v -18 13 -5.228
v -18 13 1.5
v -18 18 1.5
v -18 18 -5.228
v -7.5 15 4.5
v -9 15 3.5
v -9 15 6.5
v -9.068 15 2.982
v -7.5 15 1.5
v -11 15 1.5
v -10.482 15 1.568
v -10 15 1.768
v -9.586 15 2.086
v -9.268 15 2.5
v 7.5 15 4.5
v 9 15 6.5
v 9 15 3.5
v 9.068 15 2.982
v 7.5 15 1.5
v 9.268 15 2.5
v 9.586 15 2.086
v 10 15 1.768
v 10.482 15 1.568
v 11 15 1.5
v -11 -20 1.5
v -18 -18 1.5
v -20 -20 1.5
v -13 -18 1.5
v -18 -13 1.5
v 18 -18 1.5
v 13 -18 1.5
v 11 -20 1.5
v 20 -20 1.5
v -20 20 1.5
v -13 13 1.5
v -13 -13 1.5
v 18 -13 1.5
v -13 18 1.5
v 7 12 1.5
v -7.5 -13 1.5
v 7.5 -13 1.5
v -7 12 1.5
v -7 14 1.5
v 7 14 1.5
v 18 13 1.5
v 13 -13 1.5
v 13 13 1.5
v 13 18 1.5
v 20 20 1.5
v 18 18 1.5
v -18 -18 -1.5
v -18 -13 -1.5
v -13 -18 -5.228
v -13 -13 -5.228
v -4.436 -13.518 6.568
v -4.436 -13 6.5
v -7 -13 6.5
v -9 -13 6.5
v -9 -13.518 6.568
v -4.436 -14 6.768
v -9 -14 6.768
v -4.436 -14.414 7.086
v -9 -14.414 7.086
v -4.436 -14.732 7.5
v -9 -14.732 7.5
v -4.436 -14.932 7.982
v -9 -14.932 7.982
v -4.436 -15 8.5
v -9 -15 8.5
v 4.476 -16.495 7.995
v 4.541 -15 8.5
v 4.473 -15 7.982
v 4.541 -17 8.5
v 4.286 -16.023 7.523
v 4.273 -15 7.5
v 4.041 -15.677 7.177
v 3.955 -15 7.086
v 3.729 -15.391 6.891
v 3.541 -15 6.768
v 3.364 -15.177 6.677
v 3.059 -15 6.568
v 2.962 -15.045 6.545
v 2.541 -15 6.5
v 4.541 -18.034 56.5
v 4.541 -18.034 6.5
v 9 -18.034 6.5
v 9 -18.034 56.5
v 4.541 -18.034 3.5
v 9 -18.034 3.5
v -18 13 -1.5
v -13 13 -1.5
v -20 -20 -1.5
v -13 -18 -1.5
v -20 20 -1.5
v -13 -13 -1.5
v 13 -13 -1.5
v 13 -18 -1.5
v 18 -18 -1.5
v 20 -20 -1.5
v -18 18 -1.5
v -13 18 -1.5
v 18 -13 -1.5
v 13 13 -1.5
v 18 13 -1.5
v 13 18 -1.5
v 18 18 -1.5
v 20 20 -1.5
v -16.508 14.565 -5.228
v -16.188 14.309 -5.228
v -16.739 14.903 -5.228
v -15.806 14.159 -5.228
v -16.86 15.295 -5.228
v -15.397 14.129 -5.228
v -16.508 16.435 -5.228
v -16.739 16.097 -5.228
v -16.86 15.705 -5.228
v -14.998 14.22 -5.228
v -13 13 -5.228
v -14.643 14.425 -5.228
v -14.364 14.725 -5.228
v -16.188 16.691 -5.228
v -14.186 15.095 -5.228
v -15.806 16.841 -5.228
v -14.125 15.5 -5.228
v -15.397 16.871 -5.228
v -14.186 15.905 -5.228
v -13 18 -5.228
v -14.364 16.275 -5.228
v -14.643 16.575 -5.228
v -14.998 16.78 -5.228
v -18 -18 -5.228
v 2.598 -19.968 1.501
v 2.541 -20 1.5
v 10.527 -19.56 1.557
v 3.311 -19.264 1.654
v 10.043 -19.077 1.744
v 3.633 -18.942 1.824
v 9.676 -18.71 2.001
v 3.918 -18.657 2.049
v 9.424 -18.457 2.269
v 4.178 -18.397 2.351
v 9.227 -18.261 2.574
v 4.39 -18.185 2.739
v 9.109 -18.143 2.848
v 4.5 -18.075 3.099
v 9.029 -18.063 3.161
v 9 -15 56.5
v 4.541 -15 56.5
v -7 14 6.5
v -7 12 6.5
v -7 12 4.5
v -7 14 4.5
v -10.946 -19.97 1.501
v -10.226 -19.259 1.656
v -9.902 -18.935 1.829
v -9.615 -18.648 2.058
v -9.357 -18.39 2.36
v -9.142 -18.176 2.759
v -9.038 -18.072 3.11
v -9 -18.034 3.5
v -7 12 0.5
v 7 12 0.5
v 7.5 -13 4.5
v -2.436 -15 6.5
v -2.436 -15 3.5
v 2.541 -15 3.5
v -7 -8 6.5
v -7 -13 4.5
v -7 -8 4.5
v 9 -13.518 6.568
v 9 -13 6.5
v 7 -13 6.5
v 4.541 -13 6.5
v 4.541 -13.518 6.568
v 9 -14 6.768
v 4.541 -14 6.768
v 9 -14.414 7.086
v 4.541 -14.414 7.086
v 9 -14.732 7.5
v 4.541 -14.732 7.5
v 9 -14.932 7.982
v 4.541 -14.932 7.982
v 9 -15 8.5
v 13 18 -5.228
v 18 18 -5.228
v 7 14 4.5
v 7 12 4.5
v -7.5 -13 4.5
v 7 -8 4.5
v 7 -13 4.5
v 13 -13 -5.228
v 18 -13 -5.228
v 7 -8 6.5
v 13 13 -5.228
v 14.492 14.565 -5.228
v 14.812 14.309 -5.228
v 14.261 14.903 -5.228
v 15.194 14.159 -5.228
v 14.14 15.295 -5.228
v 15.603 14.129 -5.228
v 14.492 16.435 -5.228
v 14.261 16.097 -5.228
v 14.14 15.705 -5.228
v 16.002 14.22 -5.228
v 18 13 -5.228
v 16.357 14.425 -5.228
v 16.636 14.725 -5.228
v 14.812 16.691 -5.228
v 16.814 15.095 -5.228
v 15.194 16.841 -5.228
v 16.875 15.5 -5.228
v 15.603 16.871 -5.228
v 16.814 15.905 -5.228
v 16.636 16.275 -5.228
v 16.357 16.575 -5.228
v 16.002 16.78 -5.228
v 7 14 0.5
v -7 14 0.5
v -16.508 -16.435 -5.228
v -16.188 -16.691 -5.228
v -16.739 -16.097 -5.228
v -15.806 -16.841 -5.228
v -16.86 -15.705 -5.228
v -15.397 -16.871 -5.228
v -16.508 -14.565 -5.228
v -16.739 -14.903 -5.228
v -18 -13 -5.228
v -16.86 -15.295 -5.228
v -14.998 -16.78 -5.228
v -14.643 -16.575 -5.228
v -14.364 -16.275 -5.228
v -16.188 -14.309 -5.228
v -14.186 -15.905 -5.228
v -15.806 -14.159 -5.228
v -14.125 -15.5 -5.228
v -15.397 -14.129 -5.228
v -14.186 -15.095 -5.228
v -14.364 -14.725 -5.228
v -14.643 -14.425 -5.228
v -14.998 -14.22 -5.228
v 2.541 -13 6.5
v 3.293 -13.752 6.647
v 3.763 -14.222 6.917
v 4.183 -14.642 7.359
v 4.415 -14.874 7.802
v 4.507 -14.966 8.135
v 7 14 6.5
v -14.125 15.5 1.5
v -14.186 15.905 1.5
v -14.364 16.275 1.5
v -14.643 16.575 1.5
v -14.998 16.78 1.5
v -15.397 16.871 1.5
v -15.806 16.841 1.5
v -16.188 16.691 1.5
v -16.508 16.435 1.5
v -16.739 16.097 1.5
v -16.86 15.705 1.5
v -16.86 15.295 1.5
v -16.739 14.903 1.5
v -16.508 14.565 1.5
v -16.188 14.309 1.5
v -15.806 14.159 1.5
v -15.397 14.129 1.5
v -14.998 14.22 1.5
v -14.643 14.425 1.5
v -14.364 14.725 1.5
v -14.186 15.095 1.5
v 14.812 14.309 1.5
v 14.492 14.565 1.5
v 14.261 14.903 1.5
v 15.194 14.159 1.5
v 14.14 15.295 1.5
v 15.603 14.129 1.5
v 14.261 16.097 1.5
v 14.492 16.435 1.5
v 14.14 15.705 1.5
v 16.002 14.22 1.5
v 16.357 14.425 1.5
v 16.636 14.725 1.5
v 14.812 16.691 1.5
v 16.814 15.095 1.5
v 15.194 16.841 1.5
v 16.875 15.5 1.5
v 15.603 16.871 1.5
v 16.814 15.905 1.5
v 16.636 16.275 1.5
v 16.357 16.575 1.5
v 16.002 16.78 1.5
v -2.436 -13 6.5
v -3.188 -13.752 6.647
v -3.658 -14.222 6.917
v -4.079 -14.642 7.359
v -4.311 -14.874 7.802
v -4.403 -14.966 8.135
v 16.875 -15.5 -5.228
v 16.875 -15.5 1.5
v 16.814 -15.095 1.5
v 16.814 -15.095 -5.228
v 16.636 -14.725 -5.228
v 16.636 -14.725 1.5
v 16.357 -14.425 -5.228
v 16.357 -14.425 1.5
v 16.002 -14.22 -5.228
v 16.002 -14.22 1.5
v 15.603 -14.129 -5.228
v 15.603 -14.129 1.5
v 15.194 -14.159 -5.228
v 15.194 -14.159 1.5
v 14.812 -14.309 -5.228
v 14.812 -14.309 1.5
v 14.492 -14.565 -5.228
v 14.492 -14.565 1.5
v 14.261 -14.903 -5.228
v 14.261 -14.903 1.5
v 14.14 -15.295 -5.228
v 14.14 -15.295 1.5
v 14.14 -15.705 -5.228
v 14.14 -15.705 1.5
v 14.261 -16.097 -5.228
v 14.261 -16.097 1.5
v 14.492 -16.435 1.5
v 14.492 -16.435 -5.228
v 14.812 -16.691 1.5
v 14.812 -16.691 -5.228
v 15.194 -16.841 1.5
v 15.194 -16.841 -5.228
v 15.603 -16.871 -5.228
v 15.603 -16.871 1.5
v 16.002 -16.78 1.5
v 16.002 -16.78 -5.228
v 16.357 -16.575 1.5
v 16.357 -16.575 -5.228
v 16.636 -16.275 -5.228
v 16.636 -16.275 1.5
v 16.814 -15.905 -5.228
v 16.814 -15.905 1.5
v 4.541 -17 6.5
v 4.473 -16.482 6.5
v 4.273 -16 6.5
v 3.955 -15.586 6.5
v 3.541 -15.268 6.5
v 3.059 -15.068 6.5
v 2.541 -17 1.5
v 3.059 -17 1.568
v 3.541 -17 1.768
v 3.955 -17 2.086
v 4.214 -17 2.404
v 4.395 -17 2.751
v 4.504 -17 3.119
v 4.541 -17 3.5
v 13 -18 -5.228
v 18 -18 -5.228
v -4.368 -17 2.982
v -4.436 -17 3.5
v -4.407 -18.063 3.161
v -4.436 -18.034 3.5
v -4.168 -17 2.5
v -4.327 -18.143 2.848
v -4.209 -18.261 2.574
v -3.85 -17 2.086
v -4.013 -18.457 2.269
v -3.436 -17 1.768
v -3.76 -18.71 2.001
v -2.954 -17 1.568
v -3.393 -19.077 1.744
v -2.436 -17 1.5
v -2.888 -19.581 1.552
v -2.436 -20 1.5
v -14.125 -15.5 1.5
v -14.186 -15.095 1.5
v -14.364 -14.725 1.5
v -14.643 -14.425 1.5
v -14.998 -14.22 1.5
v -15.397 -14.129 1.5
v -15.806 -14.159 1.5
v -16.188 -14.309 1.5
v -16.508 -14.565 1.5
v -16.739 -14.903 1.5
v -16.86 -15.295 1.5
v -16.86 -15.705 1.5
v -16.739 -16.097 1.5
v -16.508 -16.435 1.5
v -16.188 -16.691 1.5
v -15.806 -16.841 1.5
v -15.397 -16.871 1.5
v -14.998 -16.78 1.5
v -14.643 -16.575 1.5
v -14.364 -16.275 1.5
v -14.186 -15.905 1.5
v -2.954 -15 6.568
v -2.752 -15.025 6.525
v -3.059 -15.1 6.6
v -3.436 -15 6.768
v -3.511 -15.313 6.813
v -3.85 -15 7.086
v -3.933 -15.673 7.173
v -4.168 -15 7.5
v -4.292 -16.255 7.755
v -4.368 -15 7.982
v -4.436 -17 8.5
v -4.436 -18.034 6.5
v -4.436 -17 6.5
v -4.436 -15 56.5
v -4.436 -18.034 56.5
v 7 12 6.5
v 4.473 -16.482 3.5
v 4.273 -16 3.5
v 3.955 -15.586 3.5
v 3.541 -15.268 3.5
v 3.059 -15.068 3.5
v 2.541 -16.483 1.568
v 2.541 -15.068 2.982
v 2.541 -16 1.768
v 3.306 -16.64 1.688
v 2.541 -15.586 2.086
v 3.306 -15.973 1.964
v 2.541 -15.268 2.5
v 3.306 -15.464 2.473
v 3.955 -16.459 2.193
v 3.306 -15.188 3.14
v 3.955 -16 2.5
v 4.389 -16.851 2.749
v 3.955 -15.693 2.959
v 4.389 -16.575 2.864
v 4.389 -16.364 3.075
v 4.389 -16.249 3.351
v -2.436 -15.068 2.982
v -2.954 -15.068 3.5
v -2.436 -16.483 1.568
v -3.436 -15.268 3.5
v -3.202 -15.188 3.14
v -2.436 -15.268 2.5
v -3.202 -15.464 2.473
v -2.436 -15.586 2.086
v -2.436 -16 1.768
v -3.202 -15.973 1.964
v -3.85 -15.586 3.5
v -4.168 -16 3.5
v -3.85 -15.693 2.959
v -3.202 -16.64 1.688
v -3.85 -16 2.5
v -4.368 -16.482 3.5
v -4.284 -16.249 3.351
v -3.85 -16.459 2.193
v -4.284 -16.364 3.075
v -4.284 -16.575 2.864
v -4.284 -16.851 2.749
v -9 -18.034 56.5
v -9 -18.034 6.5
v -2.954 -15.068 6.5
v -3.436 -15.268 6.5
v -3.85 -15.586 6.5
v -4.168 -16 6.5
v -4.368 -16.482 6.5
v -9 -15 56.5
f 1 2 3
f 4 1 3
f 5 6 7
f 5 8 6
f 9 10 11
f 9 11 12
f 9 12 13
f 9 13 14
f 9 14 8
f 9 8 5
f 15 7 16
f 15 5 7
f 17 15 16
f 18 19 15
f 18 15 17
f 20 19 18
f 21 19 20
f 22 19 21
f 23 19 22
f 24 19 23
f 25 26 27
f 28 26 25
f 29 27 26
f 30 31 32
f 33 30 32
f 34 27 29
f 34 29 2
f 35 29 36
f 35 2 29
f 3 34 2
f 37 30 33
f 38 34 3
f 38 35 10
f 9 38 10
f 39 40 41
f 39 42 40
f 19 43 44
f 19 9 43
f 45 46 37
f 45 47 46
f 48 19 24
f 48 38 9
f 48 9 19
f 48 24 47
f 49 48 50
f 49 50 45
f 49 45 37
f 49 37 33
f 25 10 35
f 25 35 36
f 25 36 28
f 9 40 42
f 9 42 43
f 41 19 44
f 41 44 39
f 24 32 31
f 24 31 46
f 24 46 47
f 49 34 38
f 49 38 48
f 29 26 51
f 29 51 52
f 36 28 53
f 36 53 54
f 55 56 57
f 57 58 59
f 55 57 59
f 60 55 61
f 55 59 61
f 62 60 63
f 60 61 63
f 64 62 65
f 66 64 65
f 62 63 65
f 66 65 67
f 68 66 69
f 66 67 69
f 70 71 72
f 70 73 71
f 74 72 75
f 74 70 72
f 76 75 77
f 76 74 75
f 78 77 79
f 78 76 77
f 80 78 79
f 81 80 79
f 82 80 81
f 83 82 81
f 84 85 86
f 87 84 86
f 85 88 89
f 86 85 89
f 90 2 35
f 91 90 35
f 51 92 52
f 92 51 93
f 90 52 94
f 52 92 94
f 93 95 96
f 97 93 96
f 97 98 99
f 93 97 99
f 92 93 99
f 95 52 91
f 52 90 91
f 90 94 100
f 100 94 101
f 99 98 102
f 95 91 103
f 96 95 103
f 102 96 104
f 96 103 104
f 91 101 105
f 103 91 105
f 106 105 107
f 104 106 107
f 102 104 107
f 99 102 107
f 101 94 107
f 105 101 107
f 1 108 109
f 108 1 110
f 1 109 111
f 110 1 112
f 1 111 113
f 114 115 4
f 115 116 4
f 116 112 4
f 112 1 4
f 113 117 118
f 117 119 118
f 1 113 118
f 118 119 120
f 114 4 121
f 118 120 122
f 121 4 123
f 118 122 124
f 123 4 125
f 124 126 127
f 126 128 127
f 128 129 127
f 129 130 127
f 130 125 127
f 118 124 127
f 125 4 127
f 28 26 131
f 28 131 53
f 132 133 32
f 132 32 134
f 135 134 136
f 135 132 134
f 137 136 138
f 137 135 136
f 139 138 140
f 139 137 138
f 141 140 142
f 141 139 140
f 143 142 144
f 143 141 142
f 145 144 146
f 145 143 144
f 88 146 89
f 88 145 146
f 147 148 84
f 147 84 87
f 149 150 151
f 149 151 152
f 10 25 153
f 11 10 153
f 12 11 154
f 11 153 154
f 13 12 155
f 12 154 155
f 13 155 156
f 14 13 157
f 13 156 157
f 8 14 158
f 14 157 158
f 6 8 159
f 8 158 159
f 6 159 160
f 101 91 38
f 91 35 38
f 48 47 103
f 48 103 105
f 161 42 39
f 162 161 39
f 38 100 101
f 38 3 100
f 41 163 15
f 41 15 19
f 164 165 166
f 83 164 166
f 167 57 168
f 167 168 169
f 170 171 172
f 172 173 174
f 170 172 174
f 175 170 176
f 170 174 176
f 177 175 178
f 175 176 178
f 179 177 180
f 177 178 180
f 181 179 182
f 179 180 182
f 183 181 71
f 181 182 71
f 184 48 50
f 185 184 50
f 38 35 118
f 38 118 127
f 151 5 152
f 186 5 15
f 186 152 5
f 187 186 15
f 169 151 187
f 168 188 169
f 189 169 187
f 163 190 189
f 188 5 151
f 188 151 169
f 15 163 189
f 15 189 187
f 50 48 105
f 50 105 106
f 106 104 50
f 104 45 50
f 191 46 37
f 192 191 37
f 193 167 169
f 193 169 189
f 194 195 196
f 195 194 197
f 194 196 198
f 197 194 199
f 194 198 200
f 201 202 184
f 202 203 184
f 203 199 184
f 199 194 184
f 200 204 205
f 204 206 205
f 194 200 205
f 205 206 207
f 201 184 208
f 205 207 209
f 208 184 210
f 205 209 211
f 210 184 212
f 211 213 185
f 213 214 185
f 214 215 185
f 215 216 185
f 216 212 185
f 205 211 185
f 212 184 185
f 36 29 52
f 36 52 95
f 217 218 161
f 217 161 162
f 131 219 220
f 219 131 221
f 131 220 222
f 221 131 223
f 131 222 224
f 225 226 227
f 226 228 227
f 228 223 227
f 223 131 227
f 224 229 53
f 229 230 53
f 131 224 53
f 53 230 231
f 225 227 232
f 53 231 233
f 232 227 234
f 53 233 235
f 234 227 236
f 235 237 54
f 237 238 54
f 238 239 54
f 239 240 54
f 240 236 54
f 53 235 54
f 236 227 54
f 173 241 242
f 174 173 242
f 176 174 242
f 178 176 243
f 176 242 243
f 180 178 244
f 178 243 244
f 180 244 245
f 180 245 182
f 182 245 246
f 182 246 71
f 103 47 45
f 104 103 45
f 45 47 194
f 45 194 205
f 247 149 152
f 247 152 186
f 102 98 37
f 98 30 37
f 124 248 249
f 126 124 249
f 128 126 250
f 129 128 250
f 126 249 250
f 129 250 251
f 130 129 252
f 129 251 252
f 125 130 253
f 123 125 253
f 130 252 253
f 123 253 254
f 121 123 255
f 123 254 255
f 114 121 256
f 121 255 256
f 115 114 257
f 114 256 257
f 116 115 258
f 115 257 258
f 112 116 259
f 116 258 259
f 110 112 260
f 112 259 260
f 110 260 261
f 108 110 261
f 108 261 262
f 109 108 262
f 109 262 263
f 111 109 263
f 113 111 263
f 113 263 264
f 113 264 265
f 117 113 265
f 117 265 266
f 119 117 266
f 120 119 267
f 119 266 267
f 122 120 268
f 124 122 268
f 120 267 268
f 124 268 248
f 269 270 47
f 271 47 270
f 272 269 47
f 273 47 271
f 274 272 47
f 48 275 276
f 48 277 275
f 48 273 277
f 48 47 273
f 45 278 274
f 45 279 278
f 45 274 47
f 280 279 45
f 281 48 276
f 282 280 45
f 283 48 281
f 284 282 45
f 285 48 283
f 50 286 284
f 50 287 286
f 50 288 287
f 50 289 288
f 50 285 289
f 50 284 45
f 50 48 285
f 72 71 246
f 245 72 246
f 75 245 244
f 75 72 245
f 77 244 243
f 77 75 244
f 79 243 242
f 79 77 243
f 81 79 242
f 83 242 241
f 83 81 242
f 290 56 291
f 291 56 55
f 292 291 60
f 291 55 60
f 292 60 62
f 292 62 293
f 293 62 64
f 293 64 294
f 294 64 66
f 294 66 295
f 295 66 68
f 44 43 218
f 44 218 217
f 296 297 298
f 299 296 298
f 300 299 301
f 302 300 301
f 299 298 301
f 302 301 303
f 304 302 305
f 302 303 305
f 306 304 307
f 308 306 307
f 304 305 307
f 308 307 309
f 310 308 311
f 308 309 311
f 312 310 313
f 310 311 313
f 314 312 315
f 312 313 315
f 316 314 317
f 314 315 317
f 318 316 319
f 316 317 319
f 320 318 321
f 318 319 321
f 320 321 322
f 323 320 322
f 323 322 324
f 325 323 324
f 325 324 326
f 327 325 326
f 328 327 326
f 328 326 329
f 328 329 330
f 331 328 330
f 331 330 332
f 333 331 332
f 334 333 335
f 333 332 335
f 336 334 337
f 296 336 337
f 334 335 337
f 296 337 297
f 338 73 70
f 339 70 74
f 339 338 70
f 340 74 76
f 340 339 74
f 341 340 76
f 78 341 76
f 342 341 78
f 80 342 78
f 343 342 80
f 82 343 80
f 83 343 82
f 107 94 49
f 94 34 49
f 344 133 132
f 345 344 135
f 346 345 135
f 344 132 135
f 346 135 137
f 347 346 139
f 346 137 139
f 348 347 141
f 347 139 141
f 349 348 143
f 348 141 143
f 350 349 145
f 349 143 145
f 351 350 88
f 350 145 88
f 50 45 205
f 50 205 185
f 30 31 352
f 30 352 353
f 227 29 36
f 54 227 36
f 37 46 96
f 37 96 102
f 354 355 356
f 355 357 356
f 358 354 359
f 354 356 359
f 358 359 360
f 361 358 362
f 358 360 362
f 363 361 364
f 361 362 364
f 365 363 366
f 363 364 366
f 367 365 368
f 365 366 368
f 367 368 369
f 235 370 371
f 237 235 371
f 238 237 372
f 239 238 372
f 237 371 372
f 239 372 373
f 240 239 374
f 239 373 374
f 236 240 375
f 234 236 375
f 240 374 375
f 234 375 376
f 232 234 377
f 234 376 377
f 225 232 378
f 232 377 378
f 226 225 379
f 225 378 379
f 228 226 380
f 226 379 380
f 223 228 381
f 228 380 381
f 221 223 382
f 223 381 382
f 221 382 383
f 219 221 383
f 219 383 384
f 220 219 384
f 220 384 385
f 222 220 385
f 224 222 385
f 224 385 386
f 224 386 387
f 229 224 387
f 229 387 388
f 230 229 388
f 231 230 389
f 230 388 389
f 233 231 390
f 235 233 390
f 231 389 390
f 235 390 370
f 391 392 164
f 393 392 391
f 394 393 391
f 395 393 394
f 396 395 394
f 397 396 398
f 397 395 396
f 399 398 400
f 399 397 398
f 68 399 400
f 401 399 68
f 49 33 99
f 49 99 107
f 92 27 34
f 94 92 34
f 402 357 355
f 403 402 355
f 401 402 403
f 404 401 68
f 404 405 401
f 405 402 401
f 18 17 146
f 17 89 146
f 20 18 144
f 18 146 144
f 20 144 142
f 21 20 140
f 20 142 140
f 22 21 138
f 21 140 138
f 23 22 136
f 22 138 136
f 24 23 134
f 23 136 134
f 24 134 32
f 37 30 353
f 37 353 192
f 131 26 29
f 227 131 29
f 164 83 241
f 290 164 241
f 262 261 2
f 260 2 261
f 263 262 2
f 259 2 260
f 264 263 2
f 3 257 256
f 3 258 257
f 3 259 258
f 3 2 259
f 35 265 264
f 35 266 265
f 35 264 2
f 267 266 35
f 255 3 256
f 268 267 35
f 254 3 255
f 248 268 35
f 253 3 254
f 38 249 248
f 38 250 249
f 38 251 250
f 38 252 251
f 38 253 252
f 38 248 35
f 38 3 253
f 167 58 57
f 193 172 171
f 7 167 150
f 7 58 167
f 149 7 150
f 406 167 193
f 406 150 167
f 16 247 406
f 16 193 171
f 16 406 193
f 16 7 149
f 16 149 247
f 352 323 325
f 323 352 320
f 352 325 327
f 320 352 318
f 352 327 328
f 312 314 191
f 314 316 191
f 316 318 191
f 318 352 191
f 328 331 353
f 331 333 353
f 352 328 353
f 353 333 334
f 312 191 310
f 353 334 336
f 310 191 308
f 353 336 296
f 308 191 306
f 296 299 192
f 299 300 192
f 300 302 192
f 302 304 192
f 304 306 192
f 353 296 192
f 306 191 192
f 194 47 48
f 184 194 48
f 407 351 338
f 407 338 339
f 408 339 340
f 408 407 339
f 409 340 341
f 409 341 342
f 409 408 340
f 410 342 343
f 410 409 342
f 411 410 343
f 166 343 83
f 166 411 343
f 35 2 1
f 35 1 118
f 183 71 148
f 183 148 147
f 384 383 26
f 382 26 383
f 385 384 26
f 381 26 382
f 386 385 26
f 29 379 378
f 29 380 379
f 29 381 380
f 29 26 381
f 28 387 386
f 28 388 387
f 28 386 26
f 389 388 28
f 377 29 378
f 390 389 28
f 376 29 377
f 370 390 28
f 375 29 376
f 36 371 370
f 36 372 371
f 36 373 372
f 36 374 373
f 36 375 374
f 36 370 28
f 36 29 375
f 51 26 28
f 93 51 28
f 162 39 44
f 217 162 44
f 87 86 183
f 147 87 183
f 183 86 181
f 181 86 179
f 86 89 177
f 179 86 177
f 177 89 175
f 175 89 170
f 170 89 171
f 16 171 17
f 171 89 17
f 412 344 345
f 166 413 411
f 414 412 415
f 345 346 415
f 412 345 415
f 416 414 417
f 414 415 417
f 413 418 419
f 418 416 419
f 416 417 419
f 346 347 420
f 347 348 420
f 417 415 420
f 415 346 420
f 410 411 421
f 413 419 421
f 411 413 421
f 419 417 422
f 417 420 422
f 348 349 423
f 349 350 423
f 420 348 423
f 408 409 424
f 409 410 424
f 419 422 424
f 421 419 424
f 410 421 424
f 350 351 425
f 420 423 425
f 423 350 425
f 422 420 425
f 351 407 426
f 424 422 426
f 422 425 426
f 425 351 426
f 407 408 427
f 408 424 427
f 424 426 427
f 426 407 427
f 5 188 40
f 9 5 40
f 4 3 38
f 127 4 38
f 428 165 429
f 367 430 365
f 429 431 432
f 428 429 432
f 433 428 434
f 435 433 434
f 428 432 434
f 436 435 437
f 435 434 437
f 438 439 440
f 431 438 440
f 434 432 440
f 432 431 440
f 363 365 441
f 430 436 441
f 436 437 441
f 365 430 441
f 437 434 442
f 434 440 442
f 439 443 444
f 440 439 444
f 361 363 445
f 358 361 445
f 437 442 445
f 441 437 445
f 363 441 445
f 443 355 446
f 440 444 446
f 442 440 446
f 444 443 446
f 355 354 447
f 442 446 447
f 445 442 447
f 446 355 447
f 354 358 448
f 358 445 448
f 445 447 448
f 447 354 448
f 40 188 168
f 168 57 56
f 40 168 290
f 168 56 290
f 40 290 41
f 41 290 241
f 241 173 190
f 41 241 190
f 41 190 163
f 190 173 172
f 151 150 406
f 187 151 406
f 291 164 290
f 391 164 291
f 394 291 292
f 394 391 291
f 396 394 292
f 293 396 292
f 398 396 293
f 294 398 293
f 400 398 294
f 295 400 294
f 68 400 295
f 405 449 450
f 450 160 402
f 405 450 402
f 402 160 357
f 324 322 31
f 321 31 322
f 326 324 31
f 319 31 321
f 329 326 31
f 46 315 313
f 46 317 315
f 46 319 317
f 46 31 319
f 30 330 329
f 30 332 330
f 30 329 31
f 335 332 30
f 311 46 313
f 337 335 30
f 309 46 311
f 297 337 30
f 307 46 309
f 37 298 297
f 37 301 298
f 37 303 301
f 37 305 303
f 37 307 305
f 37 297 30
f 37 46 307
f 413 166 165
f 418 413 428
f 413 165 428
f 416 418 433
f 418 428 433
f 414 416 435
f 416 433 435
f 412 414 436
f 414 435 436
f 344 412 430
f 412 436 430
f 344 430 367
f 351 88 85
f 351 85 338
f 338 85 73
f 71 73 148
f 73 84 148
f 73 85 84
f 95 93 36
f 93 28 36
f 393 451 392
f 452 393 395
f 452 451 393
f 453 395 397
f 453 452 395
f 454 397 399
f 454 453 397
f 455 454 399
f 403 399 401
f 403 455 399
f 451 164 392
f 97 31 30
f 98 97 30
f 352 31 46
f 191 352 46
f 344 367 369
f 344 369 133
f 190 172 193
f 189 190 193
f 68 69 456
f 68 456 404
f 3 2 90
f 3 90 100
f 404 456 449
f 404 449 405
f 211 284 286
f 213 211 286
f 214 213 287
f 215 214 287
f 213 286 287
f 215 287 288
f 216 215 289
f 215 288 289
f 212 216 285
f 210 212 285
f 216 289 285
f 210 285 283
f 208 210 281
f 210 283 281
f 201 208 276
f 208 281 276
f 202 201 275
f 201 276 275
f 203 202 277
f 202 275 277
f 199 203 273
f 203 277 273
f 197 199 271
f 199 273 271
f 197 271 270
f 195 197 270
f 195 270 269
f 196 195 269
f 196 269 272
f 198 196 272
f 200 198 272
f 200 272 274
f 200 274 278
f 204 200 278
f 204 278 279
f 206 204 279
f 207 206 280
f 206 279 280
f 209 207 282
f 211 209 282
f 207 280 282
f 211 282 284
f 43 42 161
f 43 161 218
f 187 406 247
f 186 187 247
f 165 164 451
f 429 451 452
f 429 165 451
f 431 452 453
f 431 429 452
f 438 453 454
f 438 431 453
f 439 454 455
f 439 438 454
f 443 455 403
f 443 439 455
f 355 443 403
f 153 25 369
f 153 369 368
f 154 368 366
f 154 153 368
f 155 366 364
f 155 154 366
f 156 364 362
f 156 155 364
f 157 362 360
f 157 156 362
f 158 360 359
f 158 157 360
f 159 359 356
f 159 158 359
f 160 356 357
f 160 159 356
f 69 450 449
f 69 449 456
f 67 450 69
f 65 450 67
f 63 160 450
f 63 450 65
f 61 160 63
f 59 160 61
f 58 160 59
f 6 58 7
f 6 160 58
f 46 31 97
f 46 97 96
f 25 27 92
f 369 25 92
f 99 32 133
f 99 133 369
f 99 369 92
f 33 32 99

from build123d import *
from OCP.BRepAlgoAPI import BRepAlgoAPI_Cut
from OCP.TopTools import TopTools_ListOfShape

# Parameters (mm, degrees)
SKETCH1_W             = 40
SKETCH1_H             = 40
SKETCH1_W_2           = 5
SKETCH1_H_2           = 5
BOSS_EXTRUDE1_DEPTH   = 1.5
BOSS_EXTRUDE2_START   = 1.5
SKETCH1_3_W           = 5
SKETCH1_3_H           = 5
SKETCH1_3_R           = 1.375
BOSS_EXTRUDE2_DEPTH   = 6.728027623
BOSS_EXTRUDE2_2_DEPTH = 6.728027623
BOSS_EXTRUDE2_3_DEPTH = 6.728027623
BOSS_EXTRUDE2_4_DEPTH = 6.728027623
SKETCH2_W             = 18
SKETCH2_H             = 5
BOSS_EXTRUDE3_DEPTH   = 15
CUT_EXTRUDE1_START    = -13
SKETCH2_3_W           = 15
SKETCH2_3_H           = 3
CUT_EXTRUDE1_DEPTH    = 28
BOSS_EXTRUDE4_START   = 1.5
SKETCH5_W             = 4.563741623
SKETCH5_H             = 3.034118579
SKETCH5_W_2           = 4.459037602
BOSS_EXTRUDE4_DEPTH   = 55
CUT_EXTRUDE2_START    = 6.5
SKETCH5_3_W           = 14
SKETCH5_3_H           = 2
CUT_EXTRUDE2_DEPTH    = 6
CUT_EXTRUDE3_START    = 6.5
SKETCH5_4_W           = 14
SKETCH5_4_H           = 5
CUT_EXTRUDE3_DEPTH    = 5
FILLET2_START         = -9
FILLET2_DEPTH         = 18
FILLET2_START_2       = -20.000000802
FILLET2_2_DEPTH       = 7.000000802
FILLET2_START_3       = -15
FILLET2_3_DEPTH       = 30
FILLET2_START_4       = -12
FILLET2_4_DEPTH       = 24
FILLET2_5_DEPTH       = 4.563741623
FILLET2_START_5       = 4.540962398
FILLET2_6_DEPTH       = 4.459037602
FILLET3_R             = 2


with BuildPart() as part:
    # Sketch1 → Boss-Extrude1 (new, symmetric)
    with BuildSketch(Plane.XY):
        Rectangle(SKETCH1_W, SKETCH1_H)
        with Locations((-15.5, -15.5)):
            Rectangle(SKETCH1_W_2, SKETCH1_H_2, mode=Mode.SUBTRACT)
        with Locations((15.5, -15.5)):
            Rectangle(SKETCH1_W_2, SKETCH1_H_2, mode=Mode.SUBTRACT)
        with Locations((15.5, 15.5)):
            Rectangle(SKETCH1_W_2, SKETCH1_H_2, mode=Mode.SUBTRACT)
        with Locations((-15.5, 15.5)):
            Rectangle(SKETCH1_W_2, SKETCH1_H_2, mode=Mode.SUBTRACT)
    extrude(amount=BOSS_EXTRUDE1_DEPTH, both=True)

    # Sketch2 → Boss-Extrude3 (add, symmetric)
    with BuildSketch(Plane(origin=(0, 0, 0), x_dir=(1, 0, 0), z_dir=(0, 1, 0))):
        with Locations((0, -4)):
            Rectangle(SKETCH2_W, SKETCH2_H)
    extrude(amount=BOSS_EXTRUDE3_DEPTH, both=True)

    # Sketch2<3> → Cut-Extrude1 (cut)
    with BuildSketch(Plane(origin=(0, 0, 0), x_dir=(1, 0, 0), z_dir=(0, 1, 0)).offset(CUT_EXTRUDE1_START)):
        with Locations((0, -3)):
            Rectangle(SKETCH2_3_W, SKETCH2_3_H)
    extrude(amount=CUT_EXTRUDE1_DEPTH, mode=Mode.SUBTRACT)

    # Sketch5 → Boss-Extrude4 (add)
    with BuildSketch(Plane.XY.offset(BOSS_EXTRUDE4_START)):
        with Locations((-6.718129189, -16.51705929)):
            Rectangle(SKETCH5_W, SKETCH5_H)
        with Locations((6.770481199, -16.51705929)):
            Rectangle(SKETCH5_W_2, SKETCH5_H)
    extrude(amount=BOSS_EXTRUDE4_DEPTH)

    # Sketch5<3> → Cut-Extrude2 (cut)
    with BuildSketch(Plane.XY.offset(CUT_EXTRUDE2_START)):
        with Locations((0, 13)):
            Rectangle(SKETCH5_3_W, SKETCH5_3_H)
    extrude(amount=-CUT_EXTRUDE2_DEPTH, mode=Mode.SUBTRACT)

    # Sketch5<4> → Cut-Extrude3 (cut)
    with BuildSketch(Plane.XY.offset(CUT_EXTRUDE3_START)):
        with Locations((0, -10.5)):
            Rectangle(SKETCH5_4_W, SKETCH5_4_H)
    extrude(amount=-CUT_EXTRUDE3_DEPTH, mode=Mode.SUBTRACT)


with BuildPart() as body_2:
    # Sketch1<3> → Boss-Extrude2 (new body)
    with BuildSketch(Plane.XY.offset(BOSS_EXTRUDE2_START)):
        with Locations((-15.5, -15.5)):
            Rectangle(SKETCH1_3_W, SKETCH1_3_H)
        with Locations((-15.5, -15.5)):
            Circle(SKETCH1_3_R, mode=Mode.SUBTRACT)
    extrude(amount=-BOSS_EXTRUDE2_DEPTH)


with BuildPart() as body_3:
    # Sketch1<3> → Boss-Extrude2 2 (new body)
    with BuildSketch(Plane.XY.offset(BOSS_EXTRUDE2_START)):
        with Locations((15.5, -15.5)):
            Rectangle(SKETCH1_3_W, SKETCH1_3_H)
        with Locations((15.5, -15.5)):
            Circle(SKETCH1_3_R, mode=Mode.SUBTRACT)
    extrude(amount=-BOSS_EXTRUDE2_2_DEPTH)


with BuildPart() as body_4:
    # Sketch1<3> → Boss-Extrude2 3 (new body)
    with BuildSketch(Plane.XY.offset(BOSS_EXTRUDE2_START)):
        with Locations((15.5, 15.5)):
            Rectangle(SKETCH1_3_W, SKETCH1_3_H)
        with Locations((15.5, 15.5)):
            Circle(SKETCH1_3_R, mode=Mode.SUBTRACT)
    extrude(amount=-BOSS_EXTRUDE2_3_DEPTH)


with BuildPart() as body_5:
    # Sketch1<3> → Boss-Extrude2 4 (new body)
    with BuildSketch(Plane.XY.offset(BOSS_EXTRUDE2_START)):
        with Locations((-15.5, 15.5)):
            Rectangle(SKETCH1_3_W, SKETCH1_3_H)
        with Locations((-15.5, 15.5)):
            Circle(SKETCH1_3_R, mode=Mode.SUBTRACT)
    extrude(amount=-BOSS_EXTRUDE2_4_DEPTH)


with BuildPart() as fillet2_tool:
    # Fillet2: read off the stored shape, not the designer's step
    # Fillet2 outline → Fillet2 (new body)
    with BuildSketch(Plane.YZ.offset(FILLET2_START)):
        with BuildLine():
            ThreePointArc((-15, 3.5), (-15.585786438, 2.085786438), (-17, 1.5))
            Line((-17, 1.5), (-15, 1.5))
            Line((-15, 1.5), (-15, 3.5))
        make_face()
    extrude(amount=FILLET2_DEPTH)


with BuildPart() as part_1:
    add(part.part)


with BuildPart() as part_2:
    # Fillet2: joined with fillet2_tool
    add(part_1.part.fuse(fillet2_tool.part, tol=0.00001))


with BuildPart() as fillet2_2_tool:
    # Fillet2 2 outline → Fillet2 2 (new body)
    with BuildSketch(Plane(origin=(0, 0, 0), x_dir=(1, 0, 0), z_dir=(0, 1, 0)).offset(FILLET2_START_2)):
        with BuildLine():
            ThreePointArc((-11, -1.5), (-9.585786438, -2.085786438), (-9, -3.5))
            Line((-9, -3.5), (-9, -6.5))
            Line((-9, -6.5), (-4.436258377, -6.5))
            Line((-4.436258377, -6.5), (-4.436258377, -3.5))
            ThreePointArc((-4.436258377, -3.5), (-3.85047194, -2.085786437), (-2.436258377, -1.5))
            Line((-2.436258377, -1.5), (-11, -1.5))
        make_face()
        with BuildLine():
            Line((4.540962398, -3.5), (4.540962398, -6.5))
            Line((4.540962398, -6.5), (9, -6.5))
            Line((9, -6.5), (9, -3.5))
            ThreePointArc((9, -3.5), (9.585786438, -2.085786438), (11, -1.5))
            Line((11, -1.5), (2.540962398, -1.5))
            ThreePointArc((2.540962398, -1.5), (3.95517596, -2.085786438), (4.540962398, -3.5))
        make_face()
    extrude(amount=FILLET2_2_DEPTH)


with BuildPart() as part_3:
    add(part_2.part)


with BuildPart() as part_4:
    # Fillet2 2: joined with fillet2_2_tool
    add(part_3.part.fuse(fillet2_2_tool.part, tol=0.00001))


with BuildPart() as fillet2_3_tool:
    # Fillet2 3 outline → Fillet2 3 (new body)
    with BuildSketch(Plane(origin=(0, 0, 0), x_dir=(1, 0, 0), z_dir=(0, 1, 0)).offset(FILLET2_START_3)):
        with BuildLine():
            ThreePointArc((-11, -1.5), (-9.585786438, -2.085786438), (-9, -3.5))
            Line((-9, -3.5), (-9, -1.5))
            Line((-9, -1.5), (-11, -1.5))
        make_face()
        with BuildLine():
            Line((9, -1.5), (9, -3.5))
            ThreePointArc((9, -3.5), (9.585786438, -2.085786438), (11, -1.5))
            Line((11, -1.5), (9, -1.5))
        make_face()
    extrude(amount=FILLET2_3_DEPTH)


with BuildPart() as part_5:
    add(part_4.part)


with BuildPart() as part_6:
    # Fillet2 3: joined with fillet2_3_tool
    add(part_5.part.fuse(fillet2_3_tool.part, tol=0.00001))


with BuildPart() as fillet2_4_tool:
    # Fillet2 4 outline → Fillet2 4 (new body)
    with BuildSketch(Plane.YZ.offset(FILLET2_START_4)):
        with BuildLine():
            ThreePointArc((-20, 1.5), (-18.607893288, 2.097610025), (-18.034118579, 3.499708959))
            Line((-18.034118579, 3.499708959), (-18.034118579, 6.5))
            Line((-18.034118579, 6.5), (-20.000000802, 6.5))
            Line((-20.000000802, 6.5), (-20, 1.5))
        make_face()
    extrude(amount=FILLET2_4_DEPTH)


with BuildPart() as part_7:
    add(part_6.part)

    # Fillet2 4: cut by fillet2_4_tool, with a tolerance
    fillet2_4_stock = TopTools_ListOfShape()
    fillet2_4_stock.Append(part_7.part.wrapped)
    fillet2_4_tools = TopTools_ListOfShape()
    fillet2_4_tools.Append(fillet2_4_tool.part.wrapped)
    fillet2_4_cut = BRepAlgoAPI_Cut()
    fillet2_4_cut.SetArguments(fillet2_4_stock)
    fillet2_4_cut.SetTools(fillet2_4_tools)
    fillet2_4_cut.SetFuzzyValue(0.00001)
    fillet2_4_cut.Build()
    add(Compound.cast(fillet2_4_cut.Shape()).solids(), mode=Mode.REPLACE)


with BuildPart() as fillet2_5_tool:
    # Fillet2 5 outline → Fillet2 5 (new body)
    with BuildSketch(Plane.YZ.offset(FILLET2_START)):
        with BuildLine():
            Line((-15, 6.5), (-13, 6.5))
            ThreePointArc((-13, 6.5), (-14.414213562, 7.085786438), (-15, 8.5))
            Line((-15, 8.5), (-15, 6.5))
        make_face()
    extrude(amount=FILLET2_5_DEPTH)


with BuildPart() as part_8:
    add(part_7.part)


with BuildPart() as part_9:
    # Fillet2 5: joined with fillet2_5_tool
    add(part_8.part.fuse(fillet2_5_tool.part, tol=0.00001))


with BuildPart() as fillet2_6_tool:
    # Fillet2 6 outline → Fillet2 6 (new body)
    with BuildSketch(Plane.YZ.offset(FILLET2_START_5)):
        with BuildLine():
            Line((-15, 6.5), (-13, 6.5))
            ThreePointArc((-13, 6.5), (-14.414213562, 7.085786438), (-15, 8.5))
            Line((-15, 8.5), (-15, 6.5))
        make_face()
    extrude(amount=FILLET2_6_DEPTH)


with BuildPart() as part_10:
    add(part_9.part)


with BuildPart() as part_11:
    # Fillet2 6: joined with fillet2_6_tool
    add(part_10.part.fuse(fillet2_6_tool.part, tol=0.00001))

    # Fillet3
    # the kernel refuses this fillet: 2 mm, written as the material it adds along each edge
    with BuildSketch(Plane(origin=(-2.436258377, -17, 3.5), x_dir=(0, 1, 0), z_dir=(-1, 0, 0))) as fillet3_piece_1_section:
        Polygon((0, 0), (FILLET3_R * 1.02, 0), (FILLET3_R * 1.02, FILLET3_R * 1.02), (0, FILLET3_R * 1.02), align=None)
    fillet3_piece_1 = extrude(amount=FILLET3_R * 1.02, mode=Mode.PRIVATE)
    fillet3_piece_1 = fillet3_piece_1 - Plane(origin=(-2.436258377, -17, 3.5), x_dir=(0, -0.7071067811865475, 0.7071067811865475), z_dir=(-1, 0, 0)) * Sphere(FILLET3_R, mode=Mode.PRIVATE)
    add(fillet3_piece_1)
    with BuildSketch(Plane(origin=(2.540962398, -17, 3.5), x_dir=(0, 1, 0), z_dir=(1, 0, 0))) as fillet3_piece_2_section:
        Polygon((0, 0), (FILLET3_R * 1.02, 0), (FILLET3_R * 1.02, -FILLET3_R * 1.02), (0, -FILLET3_R * 1.02), align=None)
    fillet3_piece_2 = extrude(amount=FILLET3_R * 1.02, mode=Mode.PRIVATE)
    fillet3_piece_2 = fillet3_piece_2 - Plane(origin=(2.540962398, -17, 3.5), x_dir=(0, -0.7071067811865475, 0.7071067811865475), z_dir=(1, 0, 0)) * Sphere(FILLET3_R, mode=Mode.PRIVATE)
    add(fillet3_piece_2)
    with BuildSketch(Plane(origin=(-4.436258377, -15, 3.5), x_dir=(6.810330077655635e-11, -1.0, 0), z_dir=(0, 0, 1))) as fillet3_piece_3:
        with BuildLine():
            CenterArc((FILLET3_R, FILLET3_R), FILLET3_R, 179.999999996, 90)
            Line((FILLET3_R * 6.81033007812e-11, FILLET3_R), (0, 0))
            Line((0, 0), (FILLET3_R, 0))
        make_face()
    extrude(amount=3)
    with BuildSketch(Plane(origin=(4.540962398, -15, 3.5), x_dir=(5.859757123971576e-12, -1.0, 0), z_dir=(0, 0, 1))) as fillet3_piece_4:
        with BuildLine():
            CenterArc((FILLET3_R, -FILLET3_R), FILLET3_R, 90, 90)
            Line((0, -FILLET3_R), (0, 0))
            Line((0, 0), (FILLET3_R, 0))
        make_face()
    extrude(amount=3)
    with BuildSketch(Plane(origin=(4.540962398, -15, 6.5), x_dir=(-1, 0, 0), z_dir=(0, 1, 0))) as fillet3_piece_5_section:
        with BuildLine():
            CenterArc((FILLET3_R, FILLET3_R), FILLET3_R, 180, 90)
            Line((0, FILLET3_R), (0, 0))
            Line((0, 0), (FILLET3_R, 0))
        make_face()
    fillet3_piece_5 = extrude(amount=2, mode=Mode.PRIVATE)
    fillet3_piece_5 = fillet3_piece_5 - Plane(origin=(4.540962398, -12.999999999, 8.500000001), x_dir=(0, -6.36912744361302e-10, -1.0), z_dir=(-1, 0, 0)) * Cylinder(2.000000001, 12, mode=Mode.PRIVATE)
    add(fillet3_piece_5)
    with BuildSketch(Plane(origin=(-4.436258377, -15, 6.5), x_dir=(1, 0, 0), z_dir=(0, 1, 0))) as fillet3_piece_6_section:
        with BuildLine():
            CenterArc((FILLET3_R, -FILLET3_R), FILLET3_R, 90, 90)
            Line((0, -FILLET3_R), (0, 0))
            Line((0, 0), (FILLET3_R, 0))
        make_face()
    fillet3_piece_6 = extrude(amount=2, mode=Mode.PRIVATE)
    fillet3_piece_6 = fillet3_piece_6 - Plane(origin=(-4.436258377, -12.999999999, 8.500000001), x_dir=(0, -6.36912744361302e-10, -1.0), z_dir=(-1, 0, 0)) * Cylinder(2.000000001, 12, mode=Mode.PRIVATE)
    add(fillet3_piece_6)
    with BuildSketch(Plane(origin=(-4.436258377, -20, 6.5), x_dir=(1, 0, 0), z_dir=(0, 1, 0))) as fillet3_piece_7a_section:
        with BuildLine():
            CenterArc((FILLET3_R, -FILLET3_R), FILLET3_R, 90, 90)
            Line((0, -FILLET3_R), (0, 0))
            Line((0, 0), (FILLET3_R, 0))
        make_face()
    fillet3_piece_7a = extrude(amount=7, mode=Mode.PRIVATE)
    fillet3_piece_7a = split(fillet3_piece_7a, bisect_by=Plane(origin=(-4.436258377, -18.034118579, 6.5), z_dir=(0, 1, 0)), keep=Keep.TOP, mode=Mode.PRIVATE)
    fillet3_piece_7a = split(fillet3_piece_7a, bisect_by=Plane(origin=(-4.436258377, -15, 6.5), z_dir=(0, -1, 0)), keep=Keep.TOP, mode=Mode.PRIVATE)
    with BuildSketch(Plane(origin=(-4.436258377, -15, 3.5), x_dir=(6.810330077655635e-11, -1.0, 0), z_dir=(0, 0, 1))) as fillet3_piece_7b_section:
        with BuildLine():
            CenterArc((FILLET3_R, FILLET3_R), FILLET3_R, 179.999999996, 90)
            Line((FILLET3_R * 6.81033007812e-11, FILLET3_R), (0, 0))
            Line((0, 0), (FILLET3_R, 0))
        make_face()
    fillet3_piece_7b = extrude(amount=8, mode=Mode.PRIVATE)
    fillet3_piece_7b = split(fillet3_piece_7b, bisect_by=Plane(origin=(-4.436258377, -15, 6.5), z_dir=(0, 0, 1)), keep=Keep.TOP, mode=Mode.PRIVATE)
    fillet3_piece_7 = fillet3_piece_7a & fillet3_piece_7b
    add(fillet3_piece_7)
    with BuildSketch(Plane(origin=(4.540962398, -20, 6.5), x_dir=(-1, 0, 0), z_dir=(0, 1, 0))) as fillet3_piece_8a_section:
        with BuildLine():
            CenterArc((FILLET3_R, FILLET3_R), FILLET3_R, 180, 90)
            Line((0, FILLET3_R), (0, 0))
            Line((0, 0), (FILLET3_R, 0))
        make_face()
    fillet3_piece_8a = extrude(amount=7, mode=Mode.PRIVATE)
    fillet3_piece_8a = split(fillet3_piece_8a, bisect_by=Plane(origin=(4.540962398, -18.034118579, 6.5), z_dir=(0, 1, 0)), keep=Keep.TOP, mode=Mode.PRIVATE)
    fillet3_piece_8a = split(fillet3_piece_8a, bisect_by=Plane(origin=(4.540962398, -15, 6.5), z_dir=(0, -1, 0)), keep=Keep.TOP, mode=Mode.PRIVATE)
    with BuildSketch(Plane(origin=(4.540962398, -15, 3.5), x_dir=(5.859757123971576e-12, -1.0, 0), z_dir=(0, 0, 1))) as fillet3_piece_8b_section:
        with BuildLine():
            CenterArc((FILLET3_R, -FILLET3_R), FILLET3_R, 90, 90)
            Line((0, -FILLET3_R), (0, 0))
            Line((0, 0), (FILLET3_R, 0))
        make_face()
    fillet3_piece_8b = extrude(amount=8, mode=Mode.PRIVATE)
    fillet3_piece_8b = split(fillet3_piece_8b, bisect_by=Plane(origin=(4.540962398, -15, 6.5), z_dir=(0, 0, 1)), keep=Keep.TOP, mode=Mode.PRIVATE)
    fillet3_piece_8 = fillet3_piece_8a & fillet3_piece_8b
    add(fillet3_piece_8)


solid = Compound([body_2.part, body_3.part, body_4.part, body_5.part, part_11.part])
